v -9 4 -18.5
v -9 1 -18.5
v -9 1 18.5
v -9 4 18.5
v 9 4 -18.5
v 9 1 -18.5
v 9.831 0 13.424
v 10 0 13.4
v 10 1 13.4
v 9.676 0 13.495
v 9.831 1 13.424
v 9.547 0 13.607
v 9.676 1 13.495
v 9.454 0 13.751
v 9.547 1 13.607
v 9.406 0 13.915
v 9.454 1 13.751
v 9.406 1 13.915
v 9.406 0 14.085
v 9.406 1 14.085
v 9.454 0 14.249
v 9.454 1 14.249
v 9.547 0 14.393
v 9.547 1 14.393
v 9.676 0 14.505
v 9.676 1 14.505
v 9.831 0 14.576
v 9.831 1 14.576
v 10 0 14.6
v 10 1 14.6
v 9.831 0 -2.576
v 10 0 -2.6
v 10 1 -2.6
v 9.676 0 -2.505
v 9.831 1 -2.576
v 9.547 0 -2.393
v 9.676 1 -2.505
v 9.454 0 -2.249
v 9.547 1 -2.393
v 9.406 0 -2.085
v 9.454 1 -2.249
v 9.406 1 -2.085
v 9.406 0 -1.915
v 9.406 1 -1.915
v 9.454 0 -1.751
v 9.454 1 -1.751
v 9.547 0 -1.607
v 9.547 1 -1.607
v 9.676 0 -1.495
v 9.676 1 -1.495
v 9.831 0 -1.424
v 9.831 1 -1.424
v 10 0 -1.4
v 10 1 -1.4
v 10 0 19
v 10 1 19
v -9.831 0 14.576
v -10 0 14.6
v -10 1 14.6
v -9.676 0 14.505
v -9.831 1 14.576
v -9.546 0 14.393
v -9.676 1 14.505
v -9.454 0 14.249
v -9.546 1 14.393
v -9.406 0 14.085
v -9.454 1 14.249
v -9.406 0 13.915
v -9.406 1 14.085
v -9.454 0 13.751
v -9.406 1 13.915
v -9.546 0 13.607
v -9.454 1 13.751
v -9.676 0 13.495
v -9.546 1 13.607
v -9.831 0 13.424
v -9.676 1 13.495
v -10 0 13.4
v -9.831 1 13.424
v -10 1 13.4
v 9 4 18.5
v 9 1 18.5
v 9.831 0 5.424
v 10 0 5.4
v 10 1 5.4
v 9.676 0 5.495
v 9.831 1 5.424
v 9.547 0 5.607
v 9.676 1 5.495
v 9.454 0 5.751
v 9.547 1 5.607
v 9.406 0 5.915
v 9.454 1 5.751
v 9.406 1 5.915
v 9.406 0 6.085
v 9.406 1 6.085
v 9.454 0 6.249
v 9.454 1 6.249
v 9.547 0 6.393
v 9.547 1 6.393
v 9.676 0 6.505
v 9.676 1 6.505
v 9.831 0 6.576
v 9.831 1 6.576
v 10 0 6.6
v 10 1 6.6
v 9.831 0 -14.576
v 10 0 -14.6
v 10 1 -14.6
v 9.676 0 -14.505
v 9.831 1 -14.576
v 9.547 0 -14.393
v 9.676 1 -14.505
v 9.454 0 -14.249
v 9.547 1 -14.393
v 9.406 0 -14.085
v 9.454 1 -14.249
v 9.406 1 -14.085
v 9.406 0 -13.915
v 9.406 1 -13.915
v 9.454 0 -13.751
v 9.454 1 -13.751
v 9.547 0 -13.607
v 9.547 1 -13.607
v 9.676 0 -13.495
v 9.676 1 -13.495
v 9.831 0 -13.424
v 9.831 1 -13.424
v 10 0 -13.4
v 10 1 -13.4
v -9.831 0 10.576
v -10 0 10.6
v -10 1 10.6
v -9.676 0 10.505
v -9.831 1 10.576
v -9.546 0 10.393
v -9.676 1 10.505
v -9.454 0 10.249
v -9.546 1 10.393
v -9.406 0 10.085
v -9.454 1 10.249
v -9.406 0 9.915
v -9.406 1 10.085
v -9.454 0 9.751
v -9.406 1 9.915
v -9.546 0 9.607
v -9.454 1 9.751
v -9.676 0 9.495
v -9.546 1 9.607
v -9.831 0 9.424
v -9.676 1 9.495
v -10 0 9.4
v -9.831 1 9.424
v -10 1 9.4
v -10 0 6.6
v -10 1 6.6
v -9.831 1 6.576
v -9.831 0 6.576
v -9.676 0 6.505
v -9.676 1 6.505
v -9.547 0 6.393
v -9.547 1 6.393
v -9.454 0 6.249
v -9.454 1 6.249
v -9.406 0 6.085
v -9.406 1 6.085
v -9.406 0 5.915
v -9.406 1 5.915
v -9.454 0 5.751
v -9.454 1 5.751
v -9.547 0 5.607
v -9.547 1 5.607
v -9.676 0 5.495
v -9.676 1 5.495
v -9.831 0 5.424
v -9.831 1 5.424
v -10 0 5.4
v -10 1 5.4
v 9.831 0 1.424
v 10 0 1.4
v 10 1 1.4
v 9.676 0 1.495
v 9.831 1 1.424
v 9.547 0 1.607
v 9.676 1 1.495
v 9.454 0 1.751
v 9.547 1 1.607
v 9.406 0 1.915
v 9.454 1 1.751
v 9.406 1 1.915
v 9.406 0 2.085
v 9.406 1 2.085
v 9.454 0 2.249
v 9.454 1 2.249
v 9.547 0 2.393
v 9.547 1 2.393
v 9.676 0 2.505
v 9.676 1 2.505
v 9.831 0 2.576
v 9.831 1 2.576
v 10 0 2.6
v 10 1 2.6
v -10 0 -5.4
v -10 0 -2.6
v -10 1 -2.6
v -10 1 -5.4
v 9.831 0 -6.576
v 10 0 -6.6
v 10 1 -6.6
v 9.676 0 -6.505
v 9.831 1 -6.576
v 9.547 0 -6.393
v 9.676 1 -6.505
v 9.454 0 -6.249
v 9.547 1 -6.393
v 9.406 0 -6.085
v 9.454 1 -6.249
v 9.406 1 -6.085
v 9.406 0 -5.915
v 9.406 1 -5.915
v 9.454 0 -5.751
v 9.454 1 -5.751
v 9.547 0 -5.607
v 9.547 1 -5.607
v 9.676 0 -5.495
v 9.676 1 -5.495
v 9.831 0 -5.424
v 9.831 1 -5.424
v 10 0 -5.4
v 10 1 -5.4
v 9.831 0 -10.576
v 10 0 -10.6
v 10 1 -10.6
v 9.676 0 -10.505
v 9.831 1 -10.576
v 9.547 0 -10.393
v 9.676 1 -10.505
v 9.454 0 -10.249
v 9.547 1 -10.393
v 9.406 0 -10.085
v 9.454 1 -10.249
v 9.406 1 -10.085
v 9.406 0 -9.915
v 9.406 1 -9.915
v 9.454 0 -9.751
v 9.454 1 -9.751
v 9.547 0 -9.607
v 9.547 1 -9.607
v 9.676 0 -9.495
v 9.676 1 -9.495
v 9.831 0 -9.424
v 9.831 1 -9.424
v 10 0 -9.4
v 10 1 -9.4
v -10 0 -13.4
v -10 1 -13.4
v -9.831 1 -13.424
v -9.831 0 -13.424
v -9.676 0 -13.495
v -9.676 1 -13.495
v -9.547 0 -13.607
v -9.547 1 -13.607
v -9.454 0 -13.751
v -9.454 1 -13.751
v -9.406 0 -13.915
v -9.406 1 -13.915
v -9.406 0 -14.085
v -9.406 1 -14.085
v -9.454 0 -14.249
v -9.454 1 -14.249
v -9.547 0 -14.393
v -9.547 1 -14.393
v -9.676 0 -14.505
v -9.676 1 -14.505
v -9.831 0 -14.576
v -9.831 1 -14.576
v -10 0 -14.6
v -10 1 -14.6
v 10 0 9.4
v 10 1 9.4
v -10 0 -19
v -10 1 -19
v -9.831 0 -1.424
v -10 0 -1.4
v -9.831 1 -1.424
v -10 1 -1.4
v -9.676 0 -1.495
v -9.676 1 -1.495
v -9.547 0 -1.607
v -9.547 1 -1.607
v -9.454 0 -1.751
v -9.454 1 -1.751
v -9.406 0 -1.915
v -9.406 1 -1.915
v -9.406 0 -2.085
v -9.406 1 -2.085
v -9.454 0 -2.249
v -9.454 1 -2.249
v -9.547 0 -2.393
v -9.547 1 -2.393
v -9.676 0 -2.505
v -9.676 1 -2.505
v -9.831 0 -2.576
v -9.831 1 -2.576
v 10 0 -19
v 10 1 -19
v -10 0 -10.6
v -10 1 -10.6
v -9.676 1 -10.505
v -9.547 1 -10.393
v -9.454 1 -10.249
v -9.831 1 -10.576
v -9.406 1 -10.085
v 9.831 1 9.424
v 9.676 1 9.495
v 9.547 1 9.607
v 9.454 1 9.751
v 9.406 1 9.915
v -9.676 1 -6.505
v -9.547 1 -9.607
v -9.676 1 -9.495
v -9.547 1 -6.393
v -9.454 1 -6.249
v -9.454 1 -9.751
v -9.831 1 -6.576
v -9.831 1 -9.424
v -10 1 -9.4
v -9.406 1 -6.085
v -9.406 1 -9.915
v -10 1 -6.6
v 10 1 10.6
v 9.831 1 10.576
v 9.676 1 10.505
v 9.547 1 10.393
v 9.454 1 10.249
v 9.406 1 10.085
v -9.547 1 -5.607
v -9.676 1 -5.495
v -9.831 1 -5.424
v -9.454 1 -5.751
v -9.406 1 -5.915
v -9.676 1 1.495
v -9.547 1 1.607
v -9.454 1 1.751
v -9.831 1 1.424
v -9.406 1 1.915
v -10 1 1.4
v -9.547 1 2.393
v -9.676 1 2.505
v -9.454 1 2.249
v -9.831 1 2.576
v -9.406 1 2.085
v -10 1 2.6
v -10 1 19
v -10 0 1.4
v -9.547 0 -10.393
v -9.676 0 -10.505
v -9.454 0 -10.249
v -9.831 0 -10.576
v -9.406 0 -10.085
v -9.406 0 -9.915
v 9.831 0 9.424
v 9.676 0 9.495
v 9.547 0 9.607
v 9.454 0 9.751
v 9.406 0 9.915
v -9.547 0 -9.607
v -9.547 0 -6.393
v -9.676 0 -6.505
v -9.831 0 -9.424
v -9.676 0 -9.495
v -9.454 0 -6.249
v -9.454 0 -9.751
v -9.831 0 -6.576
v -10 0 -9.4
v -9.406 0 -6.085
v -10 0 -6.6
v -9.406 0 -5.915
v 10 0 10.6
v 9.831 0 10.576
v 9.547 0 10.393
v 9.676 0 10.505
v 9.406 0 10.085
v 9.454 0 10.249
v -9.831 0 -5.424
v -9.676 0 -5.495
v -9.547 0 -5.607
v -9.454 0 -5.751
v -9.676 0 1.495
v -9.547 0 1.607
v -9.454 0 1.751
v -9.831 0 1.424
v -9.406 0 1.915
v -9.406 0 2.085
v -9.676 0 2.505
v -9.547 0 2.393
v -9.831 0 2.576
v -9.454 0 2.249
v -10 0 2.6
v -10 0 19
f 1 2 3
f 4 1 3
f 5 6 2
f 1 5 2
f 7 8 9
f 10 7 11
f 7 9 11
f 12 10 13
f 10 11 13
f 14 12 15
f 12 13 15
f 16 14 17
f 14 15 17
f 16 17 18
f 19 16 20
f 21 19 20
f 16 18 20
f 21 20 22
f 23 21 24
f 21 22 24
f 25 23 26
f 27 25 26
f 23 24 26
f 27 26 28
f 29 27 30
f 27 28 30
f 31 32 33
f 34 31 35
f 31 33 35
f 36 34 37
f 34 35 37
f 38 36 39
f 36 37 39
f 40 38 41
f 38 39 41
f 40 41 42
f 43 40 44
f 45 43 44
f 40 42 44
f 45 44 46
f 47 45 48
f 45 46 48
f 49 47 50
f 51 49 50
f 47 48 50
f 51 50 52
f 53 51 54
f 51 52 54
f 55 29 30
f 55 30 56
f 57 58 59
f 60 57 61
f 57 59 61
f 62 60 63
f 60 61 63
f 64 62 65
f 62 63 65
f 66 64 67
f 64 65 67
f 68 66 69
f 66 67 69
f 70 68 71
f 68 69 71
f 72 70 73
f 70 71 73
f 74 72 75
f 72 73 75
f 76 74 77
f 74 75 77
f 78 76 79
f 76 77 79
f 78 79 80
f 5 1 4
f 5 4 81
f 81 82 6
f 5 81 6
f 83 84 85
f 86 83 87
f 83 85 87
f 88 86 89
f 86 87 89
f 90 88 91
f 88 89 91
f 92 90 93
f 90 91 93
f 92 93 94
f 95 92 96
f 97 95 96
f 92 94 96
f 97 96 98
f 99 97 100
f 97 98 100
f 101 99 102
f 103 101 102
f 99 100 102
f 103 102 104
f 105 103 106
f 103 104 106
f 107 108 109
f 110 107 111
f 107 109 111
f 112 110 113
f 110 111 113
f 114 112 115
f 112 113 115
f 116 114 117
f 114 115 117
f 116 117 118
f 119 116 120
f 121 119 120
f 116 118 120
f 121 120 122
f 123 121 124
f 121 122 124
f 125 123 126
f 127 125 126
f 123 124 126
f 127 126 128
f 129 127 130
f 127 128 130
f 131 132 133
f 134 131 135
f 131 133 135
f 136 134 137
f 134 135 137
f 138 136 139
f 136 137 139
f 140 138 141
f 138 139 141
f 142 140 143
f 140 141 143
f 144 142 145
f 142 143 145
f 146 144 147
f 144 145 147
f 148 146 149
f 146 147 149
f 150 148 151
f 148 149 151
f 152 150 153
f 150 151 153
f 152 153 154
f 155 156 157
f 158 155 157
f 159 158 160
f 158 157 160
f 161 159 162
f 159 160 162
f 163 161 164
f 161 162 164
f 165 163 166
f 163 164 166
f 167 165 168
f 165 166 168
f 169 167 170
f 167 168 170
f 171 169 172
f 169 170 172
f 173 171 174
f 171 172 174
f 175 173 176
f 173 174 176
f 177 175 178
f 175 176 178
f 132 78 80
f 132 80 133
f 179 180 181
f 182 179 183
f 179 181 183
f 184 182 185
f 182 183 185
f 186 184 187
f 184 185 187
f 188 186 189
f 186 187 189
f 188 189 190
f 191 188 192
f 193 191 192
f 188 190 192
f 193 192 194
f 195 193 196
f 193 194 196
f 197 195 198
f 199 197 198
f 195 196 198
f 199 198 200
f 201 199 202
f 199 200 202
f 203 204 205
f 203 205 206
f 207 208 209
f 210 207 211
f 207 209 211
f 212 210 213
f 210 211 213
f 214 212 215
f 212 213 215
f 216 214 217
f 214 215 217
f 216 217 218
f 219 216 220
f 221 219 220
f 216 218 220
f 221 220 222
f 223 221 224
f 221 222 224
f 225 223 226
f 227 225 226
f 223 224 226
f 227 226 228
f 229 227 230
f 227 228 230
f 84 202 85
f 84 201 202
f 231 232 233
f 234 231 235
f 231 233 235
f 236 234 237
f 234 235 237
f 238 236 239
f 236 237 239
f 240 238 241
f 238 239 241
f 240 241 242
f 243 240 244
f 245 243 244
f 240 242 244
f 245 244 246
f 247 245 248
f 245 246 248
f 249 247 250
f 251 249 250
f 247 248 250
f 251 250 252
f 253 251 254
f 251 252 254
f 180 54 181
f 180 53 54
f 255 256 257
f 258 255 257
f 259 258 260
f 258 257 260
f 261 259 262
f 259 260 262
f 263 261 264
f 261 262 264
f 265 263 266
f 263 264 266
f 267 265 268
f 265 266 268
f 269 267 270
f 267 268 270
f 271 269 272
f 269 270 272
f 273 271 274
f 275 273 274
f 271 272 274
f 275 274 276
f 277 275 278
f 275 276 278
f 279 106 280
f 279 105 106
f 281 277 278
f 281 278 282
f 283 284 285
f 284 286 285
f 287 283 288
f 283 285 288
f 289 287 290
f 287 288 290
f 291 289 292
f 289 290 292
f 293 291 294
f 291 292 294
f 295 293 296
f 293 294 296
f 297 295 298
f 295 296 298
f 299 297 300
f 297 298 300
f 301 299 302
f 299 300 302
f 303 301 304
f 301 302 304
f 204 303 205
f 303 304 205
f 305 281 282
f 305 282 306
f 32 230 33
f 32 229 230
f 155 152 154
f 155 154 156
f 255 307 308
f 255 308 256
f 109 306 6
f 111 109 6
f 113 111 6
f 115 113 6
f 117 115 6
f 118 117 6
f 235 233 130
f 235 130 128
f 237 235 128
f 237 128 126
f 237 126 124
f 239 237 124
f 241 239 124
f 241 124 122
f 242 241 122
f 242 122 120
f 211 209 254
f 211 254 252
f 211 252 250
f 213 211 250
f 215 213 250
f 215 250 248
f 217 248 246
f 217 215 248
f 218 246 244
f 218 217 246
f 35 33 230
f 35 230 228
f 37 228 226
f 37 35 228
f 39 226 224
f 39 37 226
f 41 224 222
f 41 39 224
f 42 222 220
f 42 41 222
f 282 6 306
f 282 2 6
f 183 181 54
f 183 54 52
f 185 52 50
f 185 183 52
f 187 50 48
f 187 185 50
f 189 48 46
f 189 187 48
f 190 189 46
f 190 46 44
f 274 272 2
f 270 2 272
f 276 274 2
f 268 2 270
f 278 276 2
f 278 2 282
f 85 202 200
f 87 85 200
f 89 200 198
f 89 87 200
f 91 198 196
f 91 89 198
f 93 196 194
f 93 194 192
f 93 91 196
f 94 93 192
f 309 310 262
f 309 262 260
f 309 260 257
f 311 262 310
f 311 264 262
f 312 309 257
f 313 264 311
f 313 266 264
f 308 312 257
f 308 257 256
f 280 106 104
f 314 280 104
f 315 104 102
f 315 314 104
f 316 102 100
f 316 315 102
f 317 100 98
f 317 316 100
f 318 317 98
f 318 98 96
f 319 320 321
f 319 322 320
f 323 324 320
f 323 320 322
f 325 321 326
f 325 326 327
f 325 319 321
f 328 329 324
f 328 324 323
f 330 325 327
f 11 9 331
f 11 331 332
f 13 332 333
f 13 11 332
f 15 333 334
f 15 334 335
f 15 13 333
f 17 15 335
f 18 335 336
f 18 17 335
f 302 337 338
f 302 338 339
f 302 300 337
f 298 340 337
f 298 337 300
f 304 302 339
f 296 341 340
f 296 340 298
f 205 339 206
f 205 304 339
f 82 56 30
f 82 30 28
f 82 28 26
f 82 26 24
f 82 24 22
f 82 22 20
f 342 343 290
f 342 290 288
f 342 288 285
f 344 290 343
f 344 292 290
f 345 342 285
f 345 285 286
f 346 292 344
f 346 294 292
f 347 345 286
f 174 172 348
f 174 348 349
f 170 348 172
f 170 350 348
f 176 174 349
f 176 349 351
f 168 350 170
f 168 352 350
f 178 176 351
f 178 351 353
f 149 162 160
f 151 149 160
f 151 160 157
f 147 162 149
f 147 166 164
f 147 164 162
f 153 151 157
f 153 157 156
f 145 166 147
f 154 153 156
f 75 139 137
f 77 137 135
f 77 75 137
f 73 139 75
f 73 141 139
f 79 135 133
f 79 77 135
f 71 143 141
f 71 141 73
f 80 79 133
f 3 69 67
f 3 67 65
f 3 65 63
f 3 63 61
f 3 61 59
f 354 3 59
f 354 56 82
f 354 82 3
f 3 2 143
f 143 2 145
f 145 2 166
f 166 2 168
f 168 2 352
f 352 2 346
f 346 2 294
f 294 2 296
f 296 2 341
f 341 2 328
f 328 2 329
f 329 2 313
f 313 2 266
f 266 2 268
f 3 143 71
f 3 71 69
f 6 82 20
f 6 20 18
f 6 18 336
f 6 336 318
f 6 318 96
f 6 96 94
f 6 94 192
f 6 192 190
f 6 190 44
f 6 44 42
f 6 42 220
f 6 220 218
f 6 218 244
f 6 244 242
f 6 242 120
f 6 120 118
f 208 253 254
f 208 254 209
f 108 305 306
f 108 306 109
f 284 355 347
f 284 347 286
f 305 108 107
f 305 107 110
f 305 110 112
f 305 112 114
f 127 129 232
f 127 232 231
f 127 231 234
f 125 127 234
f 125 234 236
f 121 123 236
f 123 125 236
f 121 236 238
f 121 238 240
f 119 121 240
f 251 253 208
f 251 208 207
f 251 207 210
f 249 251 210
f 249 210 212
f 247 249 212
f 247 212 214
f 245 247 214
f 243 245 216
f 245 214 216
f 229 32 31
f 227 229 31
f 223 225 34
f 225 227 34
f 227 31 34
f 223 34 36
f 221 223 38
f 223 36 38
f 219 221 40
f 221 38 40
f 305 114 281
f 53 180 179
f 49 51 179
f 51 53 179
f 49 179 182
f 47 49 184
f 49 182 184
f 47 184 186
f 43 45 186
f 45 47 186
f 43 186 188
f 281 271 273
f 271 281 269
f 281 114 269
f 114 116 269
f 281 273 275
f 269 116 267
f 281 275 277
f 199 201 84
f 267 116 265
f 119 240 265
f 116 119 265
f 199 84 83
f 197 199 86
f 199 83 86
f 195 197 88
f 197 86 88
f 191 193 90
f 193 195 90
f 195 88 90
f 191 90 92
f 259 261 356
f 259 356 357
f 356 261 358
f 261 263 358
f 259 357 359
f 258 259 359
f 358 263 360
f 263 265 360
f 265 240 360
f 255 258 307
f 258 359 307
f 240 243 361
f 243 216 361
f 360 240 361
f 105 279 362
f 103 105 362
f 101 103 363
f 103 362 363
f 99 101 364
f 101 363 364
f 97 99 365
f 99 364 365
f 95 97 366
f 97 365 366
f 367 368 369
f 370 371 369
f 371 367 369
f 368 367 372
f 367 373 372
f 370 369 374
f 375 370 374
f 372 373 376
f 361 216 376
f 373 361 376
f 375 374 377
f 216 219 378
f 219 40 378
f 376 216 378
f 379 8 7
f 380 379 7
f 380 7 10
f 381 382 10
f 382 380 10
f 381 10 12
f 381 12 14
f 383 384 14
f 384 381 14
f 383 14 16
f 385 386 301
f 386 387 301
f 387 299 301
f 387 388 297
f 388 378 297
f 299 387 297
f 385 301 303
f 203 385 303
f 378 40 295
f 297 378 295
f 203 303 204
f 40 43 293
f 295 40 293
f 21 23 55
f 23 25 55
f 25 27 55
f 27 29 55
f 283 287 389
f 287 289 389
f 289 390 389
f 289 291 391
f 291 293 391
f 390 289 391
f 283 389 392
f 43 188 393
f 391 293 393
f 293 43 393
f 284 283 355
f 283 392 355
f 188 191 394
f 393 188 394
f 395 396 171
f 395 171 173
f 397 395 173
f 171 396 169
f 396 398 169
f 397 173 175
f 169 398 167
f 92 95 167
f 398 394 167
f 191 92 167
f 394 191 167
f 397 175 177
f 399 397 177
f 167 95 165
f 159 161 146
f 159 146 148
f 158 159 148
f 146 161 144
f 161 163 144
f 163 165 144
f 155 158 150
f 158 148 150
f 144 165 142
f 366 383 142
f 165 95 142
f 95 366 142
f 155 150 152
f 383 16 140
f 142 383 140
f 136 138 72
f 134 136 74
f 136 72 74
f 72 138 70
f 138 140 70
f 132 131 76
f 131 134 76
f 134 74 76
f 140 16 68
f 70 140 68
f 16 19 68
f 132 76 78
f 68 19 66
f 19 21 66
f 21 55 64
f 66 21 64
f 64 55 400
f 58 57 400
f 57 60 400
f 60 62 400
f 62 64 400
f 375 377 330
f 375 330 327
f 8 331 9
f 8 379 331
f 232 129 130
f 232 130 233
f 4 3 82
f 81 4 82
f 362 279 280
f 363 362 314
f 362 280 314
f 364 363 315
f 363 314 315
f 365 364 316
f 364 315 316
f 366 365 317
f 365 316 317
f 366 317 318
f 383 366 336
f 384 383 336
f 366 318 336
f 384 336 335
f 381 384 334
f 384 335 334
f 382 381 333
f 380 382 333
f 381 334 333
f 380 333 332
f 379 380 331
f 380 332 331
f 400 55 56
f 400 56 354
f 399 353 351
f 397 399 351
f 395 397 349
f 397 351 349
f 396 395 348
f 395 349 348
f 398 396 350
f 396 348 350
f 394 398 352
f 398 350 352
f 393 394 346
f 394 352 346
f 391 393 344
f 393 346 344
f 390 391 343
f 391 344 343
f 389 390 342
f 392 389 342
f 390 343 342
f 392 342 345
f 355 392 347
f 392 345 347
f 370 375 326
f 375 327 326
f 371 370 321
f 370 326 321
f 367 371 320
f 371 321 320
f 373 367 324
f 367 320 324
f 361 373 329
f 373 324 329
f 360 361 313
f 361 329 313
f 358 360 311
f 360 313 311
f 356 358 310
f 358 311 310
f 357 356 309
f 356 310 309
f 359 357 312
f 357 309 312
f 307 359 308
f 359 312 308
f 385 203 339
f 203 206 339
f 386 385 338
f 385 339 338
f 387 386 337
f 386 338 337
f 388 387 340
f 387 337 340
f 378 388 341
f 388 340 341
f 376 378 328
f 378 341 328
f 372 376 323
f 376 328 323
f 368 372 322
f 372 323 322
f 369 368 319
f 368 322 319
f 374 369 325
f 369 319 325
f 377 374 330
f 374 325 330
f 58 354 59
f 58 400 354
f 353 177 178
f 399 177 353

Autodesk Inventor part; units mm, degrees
ref_plane "YZ Plane" through (0, 0, 0) normal (1, 0, 0) x (0, 1, 0)
ref_plane "XZ Plane" through (0, 0, 0) normal (0, 1, 0) x (-1, 0, 0)
ref_plane "XY Plane" through (0, 0, 0) normal (0, 0, 1) x (1, 0, 0)
sketch "Sketch1" plane through (0, 0, 0) normal (0, 1, 0) x (-1, 0, 0)
  line L0 (-10, 19) -> (10, 19)
  line L1 (10, 19) -> (10, -19)
  line L2 (10, -19) -> (-10, -19)
  line L3 (-10, -19) -> (-10, 19)
  line L4 (-10, 19) -> (10, -19) construction
  line L5 (10, 19) -> (-10, -19) construction
  circle A0 centre (10, 14) radius 0.6
  circle A1 centre (10, 10) radius 0.6
  circle A2 centre (10, 6) radius 0.6
  circle A3 centre (10, 2) radius 0.6
  circle A4 centre (10, -2) radius 0.6
  circle A5 centre (10, -6) radius 0.6
  circle A6 centre (10, -10) radius 0.6
  circle A7 centre (10, -14) radius 0.6
  circle A8 centre (-10, 14) radius 0.6
  circle A9 centre (-10, 10) radius 0.6
  circle A10 centre (-10, 6) radius 0.6
  circle A11 centre (-10, 2) radius 0.6
  circle A12 centre (-10, -2) radius 0.6
  circle A13 centre (-10, -6) radius 0.6
  circle A14 centre (-9.9999, -10) radius 0.6
  circle A15 centre (-9.9999, -14) radius 0.6
  point P0 (0, 0)
  dimension "d0" = 20
  dimension "d1" = 38
  dimension "d2" = 1.2
  dimension "d3" = 0
  dimension "d4" = 5
  dimension "d5" = 1.2
  dimension "d6" = 1.2
  dimension "d7" = 0
  dimension "d8" = 0
  dimension "d9" = 4
  dimension "d10" = 4
  dimension "d11" = 1.2
  dimension "d13" = 1.2
  dimension "d14" = 1.2
  dimension "d15" = 0
  dimension "d16" = 0
  dimension "d17" = 0
  dimension "d18" = 4
  dimension "d19" = 4
  dimension "d20" = 4
  dimension "d22" = 1.2
  dimension "d23" = 0
  dimension "d24" = 4
  dimension "d25" = 1.2
  dimension "d26" = 0
  dimension "d27" = 4
  dimension "d28" = 1.2
  dimension "d29" = 1.2
  dimension "d30" = 1.2
  dimension "d31" = 4
  dimension "d32" = 4
  dimension "d33" = 1.2
  dimension "d34" = 4
  dimension "d35" = 5
  dimension "d36" = 0
  dimension "d37" = 1.2
  dimension "d38" = 1.2
  dimension "d39" = 1.2
  dimension "d40" = 4
  dimension "d41" = 4
  dimension "d42" = 1.2
  dimension "d43" = 4
  dimension "d44" = 5
  dimension "d45" = 0
  dimension "d46" = 4
extrude "Extrusion1" add sketch "Sketch1" along normal blind 1 contours L0 L1 A0 A1 A2 A3 A4 A5 A6 A7 L2 L3 A15 A14 A13 A12 A11 A10 A9 A8 | A8 L3 | L1 A0 | A9 L3 | L1 A1 | A10 L3 | L1 A2 | A11 L3 | L1 A3 | A12 L3 | L1 A4 | A13 L3 | L1 A5 | A14 L3 | L1 A6 | A15 L3 | L1 A7 picked at (-9.7546, 14.1247) picked at (9.9071, 13.8229) picked at (-9.7546, 10.1247) picked at (9.9071, 9.8229) picked at (-9.7991, 6.1197) picked at (9.6869, 6.1942) picked at (-9.7124, 2.1099) picked at (9.9521, 1.8058) picked at (-9.8308, -1.8486) picked at (9.9521, -2.1942) picked at (-9.7863, -5.8436) picked at (9.6325, -6.0264) picked at (-9.8, -10) picked at (9.7266, -9.8332) picked at (-9.8, -14) picked at (9.7266, -13.8332)
sketch "Sketch2" plane through (0, 1, 0) normal (0, 1, 0) x (1, 0, 0)
  line L0 (-10, 19) -> (10, 19)
  line L1 (10, 19) -> (10, -19)
  line L2 (10, -19) -> (-10, -19)
  line L3 (-10, -19) -> (-10, 19)
  line L4 (-10, 19) -> (10, -19) construction
  line L5 (10, 19) -> (-10, -19) construction
  circle A0 centre (10, 14) radius 0.6
  circle A1 centre (10, 10) radius 0.6
  circle A2 centre (10, 6) radius 0.6
  circle A3 centre (10, 2) radius 0.6
  circle A4 centre (10, -2) radius 0.6
  circle A5 centre (10, -6) radius 0.6
  circle A6 centre (10, -10) radius 0.6
  circle A7 centre (10, -14) radius 0.6
  circle A8 centre (-10, 14) radius 0.6
  circle A9 centre (-10, 10) radius 0.6
  circle A10 centre (-10, 6) radius 0.6
  circle A11 centre (-10, 2) radius 0.6
  circle A12 centre (-10, -2) radius 0.6
  circle A13 centre (-10, -6) radius 0.6
  circle A14 centre (-9.9999, -10) radius 0.6
  circle A15 centre (-9.9999, -14) radius 0.6
  point P0 (0, 0)
  point P1 (0, 0)
  dimension "d49" = 20
  dimension "d50" = 38
  dimension "d51" = 1.2
  dimension "d52" = 0
  dimension "d53" = 5
  dimension "d54" = 1.2
  dimension "d55" = 1.2
  dimension "d56" = 0
  dimension "d57" = 0
  dimension "d58" = 4
  dimension "d59" = 4
  dimension "d60" = 1.2
  dimension "d61" = 1.2
  dimension "d62" = 1.2
  dimension "d63" = 0
  dimension "d64" = 0
  dimension "d65" = 0
  dimension "d66" = 4
  dimension "d67" = 4
  dimension "d68" = 4
  dimension "d69" = 1.2
  dimension "d70" = 0
  dimension "d71" = 4
  dimension "d72" = 1.2
  dimension "d73" = 0
  dimension "d74" = 4
  dimension "d75" = 1.2
  dimension "d76" = 1.2
  dimension "d77" = 1.2
  dimension "d78" = 4
  dimension "d79" = 4
  dimension "d80" = 1.2
  dimension "d81" = 4
  dimension "d82" = 5
  dimension "d83" = 0
  dimension "d84" = 1.2
  dimension "d85" = 1.2
  dimension "d86" = 1.2
  dimension "d87" = 4
  dimension "d88" = 4
  dimension "d89" = 1.2
  dimension "d90" = 4
  dimension "d91" = 5
  dimension "d92" = 0
  dimension "d93" = 4
extrude "Extrusion2" cut sketch "Sketch2" against normal blind 1 contours A8 L3 | L3 A8 | A0 L1 | L1 A0 | A9 L3 | L3 A9 | A1 L1 | L1 A1 | A10 L3 | L3 A10 | A2 L1 | L1 A2 | A11 L3 | L3 A11 | A3 L1 | L1 A3 | A12 L3 | L3 A12 | A4 L1 | L1 A4 | A13 L3 | L3 A13 | A5 L1 | L1 A5 | A14 L3 | L3 A14 | A6 L1 | L1 A6 | A15 L3 | L3 A15 | A7 L1 | L1 A7
sketch "Sketch3" plane through (0, 1, 0) normal (0, 1, 0) x (1, 0, 0)
  line L0 (-9, -18.5) -> (9, -18.5)
  line L1 (9, -18.5) -> (9, 18.5)
  line L2 (9, 18.5) -> (-9, 18.5)
  line L3 (-9, 18.5) -> (-9, -18.5)
  line L4 (-9, -18.5) -> (9, 18.5) construction
  line L5 (9, -18.5) -> (-9, 18.5) construction
  point P0 (0, 0)
  dimension "d96" = 37
extrude "Extrusion3" add sketch "Sketch3" along normal blind 3
properties part number "Radio"
